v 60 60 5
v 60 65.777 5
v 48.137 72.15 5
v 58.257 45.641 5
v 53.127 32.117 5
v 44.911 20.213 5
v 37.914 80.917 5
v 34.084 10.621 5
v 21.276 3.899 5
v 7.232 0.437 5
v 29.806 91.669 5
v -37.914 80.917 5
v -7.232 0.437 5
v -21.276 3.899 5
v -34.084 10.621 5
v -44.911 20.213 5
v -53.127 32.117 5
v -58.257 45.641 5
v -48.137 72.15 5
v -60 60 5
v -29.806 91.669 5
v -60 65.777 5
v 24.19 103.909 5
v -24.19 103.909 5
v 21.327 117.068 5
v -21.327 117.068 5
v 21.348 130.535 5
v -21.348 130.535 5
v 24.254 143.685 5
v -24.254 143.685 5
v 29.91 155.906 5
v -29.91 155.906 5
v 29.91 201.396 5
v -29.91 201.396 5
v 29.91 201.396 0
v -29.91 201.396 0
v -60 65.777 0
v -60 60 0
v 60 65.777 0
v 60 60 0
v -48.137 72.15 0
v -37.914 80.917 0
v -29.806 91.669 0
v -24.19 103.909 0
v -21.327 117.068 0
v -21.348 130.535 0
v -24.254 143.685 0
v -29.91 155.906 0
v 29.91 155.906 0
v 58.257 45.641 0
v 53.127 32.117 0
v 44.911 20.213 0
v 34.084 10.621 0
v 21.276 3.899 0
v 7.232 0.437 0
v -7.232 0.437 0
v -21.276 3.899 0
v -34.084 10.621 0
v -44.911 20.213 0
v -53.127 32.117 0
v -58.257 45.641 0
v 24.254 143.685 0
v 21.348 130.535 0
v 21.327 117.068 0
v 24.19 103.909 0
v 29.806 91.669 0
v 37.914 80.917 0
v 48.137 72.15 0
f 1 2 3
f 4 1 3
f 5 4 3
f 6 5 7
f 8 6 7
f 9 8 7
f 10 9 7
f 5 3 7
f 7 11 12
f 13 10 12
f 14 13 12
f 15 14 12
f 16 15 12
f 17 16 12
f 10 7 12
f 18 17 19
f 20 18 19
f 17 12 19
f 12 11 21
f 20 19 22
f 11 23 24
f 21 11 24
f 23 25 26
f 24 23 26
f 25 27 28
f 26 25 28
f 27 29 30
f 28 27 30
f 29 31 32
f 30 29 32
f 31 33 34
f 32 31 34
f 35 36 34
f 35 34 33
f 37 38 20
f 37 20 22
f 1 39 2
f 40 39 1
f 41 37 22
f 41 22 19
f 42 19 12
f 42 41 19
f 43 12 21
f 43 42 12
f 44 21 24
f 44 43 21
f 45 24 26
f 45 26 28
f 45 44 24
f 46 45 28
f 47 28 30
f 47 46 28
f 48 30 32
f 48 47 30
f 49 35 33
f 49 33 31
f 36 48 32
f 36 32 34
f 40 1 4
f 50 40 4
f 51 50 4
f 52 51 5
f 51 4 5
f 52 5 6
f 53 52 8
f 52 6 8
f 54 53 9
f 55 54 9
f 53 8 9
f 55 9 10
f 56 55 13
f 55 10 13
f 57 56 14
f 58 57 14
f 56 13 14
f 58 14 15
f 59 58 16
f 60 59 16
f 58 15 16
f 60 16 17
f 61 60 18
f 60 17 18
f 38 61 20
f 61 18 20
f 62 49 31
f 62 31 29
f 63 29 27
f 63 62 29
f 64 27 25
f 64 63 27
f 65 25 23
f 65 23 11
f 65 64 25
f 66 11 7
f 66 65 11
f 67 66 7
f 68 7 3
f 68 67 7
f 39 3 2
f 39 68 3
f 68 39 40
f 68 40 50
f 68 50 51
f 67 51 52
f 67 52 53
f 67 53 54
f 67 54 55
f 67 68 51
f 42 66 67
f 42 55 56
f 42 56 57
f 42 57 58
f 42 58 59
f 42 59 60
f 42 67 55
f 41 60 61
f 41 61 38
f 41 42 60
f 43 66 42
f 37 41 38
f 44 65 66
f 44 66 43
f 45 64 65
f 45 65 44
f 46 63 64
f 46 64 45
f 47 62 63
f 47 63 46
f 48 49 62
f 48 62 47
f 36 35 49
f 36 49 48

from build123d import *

# Parameters (mm, degrees)
BOSS_EXTRUDE1_DEPTH = 5
CUT_EXTRUDE1_DEPTH  = 6


with BuildPart() as part:
    # Sketch1 → Boss-Extrude1 (new body)
    with BuildSketch(Plane.XY):
        with BuildLine():
            Line((60, 65.777063513), (60, 0))
            Line((60, 0), (-60, 0))
            Line((-60, 0), (-60, 65.777063513))
            ThreePointArc((-60, 65.777063513), (-24.19023261, 103.909288798), (-29.909652169, 155.906349155))
            Line((-29.909652169, 155.906349155), (-29.909646989, 201.396349155))
            Line((-29.909646989, 201.396349155), (29.909657349, 201.396349155))
            Line((29.909657349, 201.396349155), (29.909652169, 155.906349155))
            ThreePointArc((29.909652169, 155.906349155), (24.19023261, 103.909288798), (60, 65.777063513))
        make_face()
    extrude(amount=BOSS_EXTRUDE1_DEPTH)

    # Sketch2 → Cut-Extrude1 (cut, through all)
    with BuildSketch(Plane.XY.offset(5)):
        with BuildLine():
            Line((-60, 60), (-60, -14.155296416))
            Line((-60, -14.155296416), (60, -14.155296416))
            Line((60, -14.155296416), (60, 60))
            ThreePointArc((60, 60), (0, 0), (-60, 60))
        make_face()
    extrude(amount=-CUT_EXTRUDE1_DEPTH, mode=Mode.SUBTRACT)


solid = part.part
